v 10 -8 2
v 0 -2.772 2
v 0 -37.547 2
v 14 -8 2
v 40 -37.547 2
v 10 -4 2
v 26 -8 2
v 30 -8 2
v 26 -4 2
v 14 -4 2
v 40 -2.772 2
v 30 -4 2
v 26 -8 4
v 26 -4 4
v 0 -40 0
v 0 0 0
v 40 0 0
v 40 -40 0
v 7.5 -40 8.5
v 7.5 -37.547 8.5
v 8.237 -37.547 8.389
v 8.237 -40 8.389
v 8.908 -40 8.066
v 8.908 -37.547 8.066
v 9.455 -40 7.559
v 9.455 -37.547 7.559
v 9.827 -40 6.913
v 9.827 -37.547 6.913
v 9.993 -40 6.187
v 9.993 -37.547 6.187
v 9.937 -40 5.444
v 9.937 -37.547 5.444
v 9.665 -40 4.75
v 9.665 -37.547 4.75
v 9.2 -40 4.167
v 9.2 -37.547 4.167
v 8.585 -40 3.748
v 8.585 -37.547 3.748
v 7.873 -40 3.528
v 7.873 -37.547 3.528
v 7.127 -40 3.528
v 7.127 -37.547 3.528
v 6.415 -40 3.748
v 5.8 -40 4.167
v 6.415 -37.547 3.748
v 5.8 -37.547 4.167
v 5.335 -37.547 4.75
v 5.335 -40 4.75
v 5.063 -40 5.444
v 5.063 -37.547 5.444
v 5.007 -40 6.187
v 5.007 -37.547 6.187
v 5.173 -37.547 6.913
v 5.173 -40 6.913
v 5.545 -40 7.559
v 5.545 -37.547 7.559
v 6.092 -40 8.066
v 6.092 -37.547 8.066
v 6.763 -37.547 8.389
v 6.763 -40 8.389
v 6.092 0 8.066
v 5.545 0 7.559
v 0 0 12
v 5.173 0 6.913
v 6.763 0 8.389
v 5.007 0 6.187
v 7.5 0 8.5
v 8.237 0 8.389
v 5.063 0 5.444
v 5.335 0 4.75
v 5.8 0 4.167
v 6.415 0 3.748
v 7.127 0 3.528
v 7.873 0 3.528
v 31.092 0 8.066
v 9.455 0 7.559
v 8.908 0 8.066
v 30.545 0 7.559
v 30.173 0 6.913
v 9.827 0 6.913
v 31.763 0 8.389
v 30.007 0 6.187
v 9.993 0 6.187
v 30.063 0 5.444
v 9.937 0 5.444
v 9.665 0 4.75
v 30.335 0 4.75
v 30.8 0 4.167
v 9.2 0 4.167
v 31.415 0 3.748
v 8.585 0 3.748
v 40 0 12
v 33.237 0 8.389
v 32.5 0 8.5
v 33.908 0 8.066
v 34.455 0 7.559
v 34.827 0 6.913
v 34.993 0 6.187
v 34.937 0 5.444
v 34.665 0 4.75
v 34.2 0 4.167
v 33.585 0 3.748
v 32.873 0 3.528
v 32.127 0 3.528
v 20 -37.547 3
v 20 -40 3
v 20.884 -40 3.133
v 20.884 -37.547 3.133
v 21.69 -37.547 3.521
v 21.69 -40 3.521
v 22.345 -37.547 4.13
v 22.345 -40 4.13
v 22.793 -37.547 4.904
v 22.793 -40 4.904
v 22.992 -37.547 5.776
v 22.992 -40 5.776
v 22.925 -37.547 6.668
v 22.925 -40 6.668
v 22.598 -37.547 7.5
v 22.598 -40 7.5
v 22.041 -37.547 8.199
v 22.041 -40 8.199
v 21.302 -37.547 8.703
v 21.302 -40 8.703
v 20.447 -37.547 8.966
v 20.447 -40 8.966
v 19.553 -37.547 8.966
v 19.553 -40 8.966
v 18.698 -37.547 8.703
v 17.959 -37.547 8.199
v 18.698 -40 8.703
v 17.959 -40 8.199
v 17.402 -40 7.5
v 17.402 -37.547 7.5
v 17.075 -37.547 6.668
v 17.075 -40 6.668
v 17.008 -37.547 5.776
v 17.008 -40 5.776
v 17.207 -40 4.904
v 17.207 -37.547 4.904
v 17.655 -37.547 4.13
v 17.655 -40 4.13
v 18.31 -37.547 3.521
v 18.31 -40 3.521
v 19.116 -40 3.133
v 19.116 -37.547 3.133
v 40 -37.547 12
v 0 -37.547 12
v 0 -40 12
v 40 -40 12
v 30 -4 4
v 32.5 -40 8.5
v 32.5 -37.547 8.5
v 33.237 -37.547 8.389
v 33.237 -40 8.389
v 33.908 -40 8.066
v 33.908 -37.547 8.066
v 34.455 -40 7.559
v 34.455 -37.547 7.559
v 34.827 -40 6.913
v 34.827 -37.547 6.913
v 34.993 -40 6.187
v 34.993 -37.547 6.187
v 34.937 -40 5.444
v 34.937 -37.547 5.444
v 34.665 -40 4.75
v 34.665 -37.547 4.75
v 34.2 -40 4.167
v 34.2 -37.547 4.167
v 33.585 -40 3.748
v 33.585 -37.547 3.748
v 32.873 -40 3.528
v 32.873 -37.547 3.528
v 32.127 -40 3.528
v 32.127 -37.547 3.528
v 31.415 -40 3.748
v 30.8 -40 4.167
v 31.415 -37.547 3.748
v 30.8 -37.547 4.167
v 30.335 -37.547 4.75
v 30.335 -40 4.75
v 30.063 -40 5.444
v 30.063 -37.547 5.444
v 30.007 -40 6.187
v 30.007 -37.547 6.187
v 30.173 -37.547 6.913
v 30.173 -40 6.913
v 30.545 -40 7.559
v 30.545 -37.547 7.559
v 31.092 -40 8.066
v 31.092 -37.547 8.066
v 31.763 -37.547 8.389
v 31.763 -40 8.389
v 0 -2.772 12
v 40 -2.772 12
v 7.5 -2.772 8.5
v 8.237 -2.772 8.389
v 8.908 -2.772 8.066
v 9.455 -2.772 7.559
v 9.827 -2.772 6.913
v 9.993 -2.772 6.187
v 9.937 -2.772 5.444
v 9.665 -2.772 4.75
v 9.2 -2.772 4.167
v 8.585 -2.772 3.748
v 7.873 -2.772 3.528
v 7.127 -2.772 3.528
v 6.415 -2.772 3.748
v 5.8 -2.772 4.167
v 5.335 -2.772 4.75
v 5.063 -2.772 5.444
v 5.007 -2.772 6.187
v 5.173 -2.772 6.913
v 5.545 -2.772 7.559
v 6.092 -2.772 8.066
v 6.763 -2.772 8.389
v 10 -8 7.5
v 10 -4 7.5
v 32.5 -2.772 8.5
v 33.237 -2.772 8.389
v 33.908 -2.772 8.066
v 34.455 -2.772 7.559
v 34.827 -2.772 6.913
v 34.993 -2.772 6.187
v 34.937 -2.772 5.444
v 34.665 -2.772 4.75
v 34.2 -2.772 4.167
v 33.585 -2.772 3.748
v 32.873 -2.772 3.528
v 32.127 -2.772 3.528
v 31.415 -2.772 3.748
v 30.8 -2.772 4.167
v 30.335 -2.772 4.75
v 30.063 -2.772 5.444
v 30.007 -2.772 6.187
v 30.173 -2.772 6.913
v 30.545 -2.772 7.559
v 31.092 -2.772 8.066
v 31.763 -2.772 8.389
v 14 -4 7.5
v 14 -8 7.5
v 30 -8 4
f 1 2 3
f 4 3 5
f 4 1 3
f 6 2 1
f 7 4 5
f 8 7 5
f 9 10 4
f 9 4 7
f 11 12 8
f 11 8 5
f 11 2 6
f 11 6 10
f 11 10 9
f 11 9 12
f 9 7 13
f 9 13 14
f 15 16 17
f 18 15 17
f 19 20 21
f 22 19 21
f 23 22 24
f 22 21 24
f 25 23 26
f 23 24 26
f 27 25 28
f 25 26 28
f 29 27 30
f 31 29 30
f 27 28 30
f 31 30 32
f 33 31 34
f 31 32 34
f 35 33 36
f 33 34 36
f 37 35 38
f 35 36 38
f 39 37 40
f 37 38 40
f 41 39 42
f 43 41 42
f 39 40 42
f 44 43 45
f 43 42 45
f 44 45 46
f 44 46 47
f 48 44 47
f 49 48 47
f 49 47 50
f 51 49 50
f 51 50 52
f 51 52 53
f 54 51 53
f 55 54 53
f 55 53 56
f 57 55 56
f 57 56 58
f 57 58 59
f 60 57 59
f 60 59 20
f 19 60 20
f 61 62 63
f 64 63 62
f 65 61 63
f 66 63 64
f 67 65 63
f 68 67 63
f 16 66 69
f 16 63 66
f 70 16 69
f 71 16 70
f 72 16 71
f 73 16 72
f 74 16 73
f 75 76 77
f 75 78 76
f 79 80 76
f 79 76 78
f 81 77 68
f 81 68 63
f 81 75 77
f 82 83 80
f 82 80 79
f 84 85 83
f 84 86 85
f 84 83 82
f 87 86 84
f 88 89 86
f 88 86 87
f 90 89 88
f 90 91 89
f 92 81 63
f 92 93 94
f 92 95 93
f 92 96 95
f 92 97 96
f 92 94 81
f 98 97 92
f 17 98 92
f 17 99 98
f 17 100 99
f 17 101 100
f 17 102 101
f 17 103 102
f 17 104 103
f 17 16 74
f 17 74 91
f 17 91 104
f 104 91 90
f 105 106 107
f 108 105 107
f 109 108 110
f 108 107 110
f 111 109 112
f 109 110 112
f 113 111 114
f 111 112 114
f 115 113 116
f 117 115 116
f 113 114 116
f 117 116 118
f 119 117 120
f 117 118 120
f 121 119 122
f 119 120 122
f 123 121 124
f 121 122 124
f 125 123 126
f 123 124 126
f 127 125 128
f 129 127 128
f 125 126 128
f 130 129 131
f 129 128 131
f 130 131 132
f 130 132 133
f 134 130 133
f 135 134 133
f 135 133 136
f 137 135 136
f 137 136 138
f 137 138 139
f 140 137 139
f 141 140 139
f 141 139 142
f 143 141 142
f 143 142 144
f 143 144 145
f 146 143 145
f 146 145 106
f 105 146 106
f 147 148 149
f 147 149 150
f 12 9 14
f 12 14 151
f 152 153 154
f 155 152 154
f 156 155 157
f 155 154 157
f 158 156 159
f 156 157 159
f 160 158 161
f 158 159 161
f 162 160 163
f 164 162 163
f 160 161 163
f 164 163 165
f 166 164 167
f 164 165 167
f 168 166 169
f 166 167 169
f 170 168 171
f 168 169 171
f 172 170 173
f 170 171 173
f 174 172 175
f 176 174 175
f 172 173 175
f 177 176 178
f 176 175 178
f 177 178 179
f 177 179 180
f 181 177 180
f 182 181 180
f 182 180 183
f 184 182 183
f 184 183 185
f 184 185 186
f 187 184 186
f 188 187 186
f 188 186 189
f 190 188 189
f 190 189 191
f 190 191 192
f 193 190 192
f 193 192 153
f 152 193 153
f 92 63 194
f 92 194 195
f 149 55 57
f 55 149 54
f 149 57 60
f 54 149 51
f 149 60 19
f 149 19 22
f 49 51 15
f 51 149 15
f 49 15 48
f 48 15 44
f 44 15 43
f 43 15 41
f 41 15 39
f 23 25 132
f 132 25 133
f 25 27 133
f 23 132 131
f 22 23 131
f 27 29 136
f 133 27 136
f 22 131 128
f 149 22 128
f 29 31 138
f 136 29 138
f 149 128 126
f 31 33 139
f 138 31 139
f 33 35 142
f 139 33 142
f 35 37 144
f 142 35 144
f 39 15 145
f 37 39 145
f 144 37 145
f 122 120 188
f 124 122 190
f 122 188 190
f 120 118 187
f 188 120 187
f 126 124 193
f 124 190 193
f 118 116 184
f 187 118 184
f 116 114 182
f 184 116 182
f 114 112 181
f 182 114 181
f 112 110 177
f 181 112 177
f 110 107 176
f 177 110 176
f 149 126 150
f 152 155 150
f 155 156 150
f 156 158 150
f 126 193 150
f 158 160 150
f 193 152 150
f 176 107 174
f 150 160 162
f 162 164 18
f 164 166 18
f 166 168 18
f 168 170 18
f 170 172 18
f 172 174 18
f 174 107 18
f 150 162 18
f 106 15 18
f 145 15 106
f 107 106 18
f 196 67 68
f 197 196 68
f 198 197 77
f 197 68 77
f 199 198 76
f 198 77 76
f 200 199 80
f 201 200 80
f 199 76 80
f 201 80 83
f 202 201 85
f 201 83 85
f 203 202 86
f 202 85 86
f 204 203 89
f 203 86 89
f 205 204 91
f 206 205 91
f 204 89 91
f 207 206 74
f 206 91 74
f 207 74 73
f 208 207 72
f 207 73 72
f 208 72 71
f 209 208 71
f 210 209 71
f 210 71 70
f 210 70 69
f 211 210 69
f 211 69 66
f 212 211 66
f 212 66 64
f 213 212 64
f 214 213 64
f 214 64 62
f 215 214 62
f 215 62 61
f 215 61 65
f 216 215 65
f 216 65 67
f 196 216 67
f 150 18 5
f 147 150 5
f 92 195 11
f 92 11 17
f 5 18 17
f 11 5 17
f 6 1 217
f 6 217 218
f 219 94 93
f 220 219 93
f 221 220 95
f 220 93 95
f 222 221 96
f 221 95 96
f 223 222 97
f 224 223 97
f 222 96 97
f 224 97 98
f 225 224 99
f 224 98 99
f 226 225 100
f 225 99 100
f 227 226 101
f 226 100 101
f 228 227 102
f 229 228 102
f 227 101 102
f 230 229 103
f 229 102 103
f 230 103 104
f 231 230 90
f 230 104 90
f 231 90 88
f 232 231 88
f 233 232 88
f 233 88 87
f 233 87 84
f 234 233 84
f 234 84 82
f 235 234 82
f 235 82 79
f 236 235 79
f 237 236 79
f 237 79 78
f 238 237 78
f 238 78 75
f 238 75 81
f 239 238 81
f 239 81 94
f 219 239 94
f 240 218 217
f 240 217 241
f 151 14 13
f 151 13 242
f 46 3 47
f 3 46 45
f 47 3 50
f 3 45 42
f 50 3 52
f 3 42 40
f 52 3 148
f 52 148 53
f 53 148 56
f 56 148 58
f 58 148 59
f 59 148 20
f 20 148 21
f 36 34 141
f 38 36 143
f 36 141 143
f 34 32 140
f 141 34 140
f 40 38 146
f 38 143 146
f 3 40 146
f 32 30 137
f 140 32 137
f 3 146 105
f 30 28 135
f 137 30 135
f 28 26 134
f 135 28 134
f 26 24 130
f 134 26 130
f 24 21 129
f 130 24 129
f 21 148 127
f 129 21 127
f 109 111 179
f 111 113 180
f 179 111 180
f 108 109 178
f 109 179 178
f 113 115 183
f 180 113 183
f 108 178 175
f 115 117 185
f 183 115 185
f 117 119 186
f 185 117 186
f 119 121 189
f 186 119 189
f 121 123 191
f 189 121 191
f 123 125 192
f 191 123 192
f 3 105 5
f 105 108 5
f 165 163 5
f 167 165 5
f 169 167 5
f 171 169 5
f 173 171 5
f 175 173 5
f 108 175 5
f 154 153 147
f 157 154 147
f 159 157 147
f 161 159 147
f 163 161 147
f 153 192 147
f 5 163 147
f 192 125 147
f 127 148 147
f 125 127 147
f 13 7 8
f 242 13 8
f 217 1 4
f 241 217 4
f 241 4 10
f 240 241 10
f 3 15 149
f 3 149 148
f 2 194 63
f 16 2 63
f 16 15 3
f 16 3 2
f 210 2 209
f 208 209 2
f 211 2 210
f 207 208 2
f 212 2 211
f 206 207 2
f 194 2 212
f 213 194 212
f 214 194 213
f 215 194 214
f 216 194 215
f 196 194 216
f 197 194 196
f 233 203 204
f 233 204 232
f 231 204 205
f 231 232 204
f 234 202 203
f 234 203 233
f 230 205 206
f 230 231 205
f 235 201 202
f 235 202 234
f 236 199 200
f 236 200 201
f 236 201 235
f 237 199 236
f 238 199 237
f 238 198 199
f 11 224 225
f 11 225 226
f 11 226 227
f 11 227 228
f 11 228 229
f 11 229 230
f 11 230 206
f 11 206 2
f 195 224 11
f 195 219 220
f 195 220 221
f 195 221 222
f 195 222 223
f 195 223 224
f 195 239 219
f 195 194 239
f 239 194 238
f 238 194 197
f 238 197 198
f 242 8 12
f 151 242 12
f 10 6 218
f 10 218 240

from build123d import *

# Parameters (mm, degrees)
SKETCH_2_W          = 40
SKETCH_2_H          = 40
EXTRUDE_1_DEPTH     = 12
SKETCH_3_R          = 2.5
CUT_EXTRUDE_1_DEPTH = 58.827329179
SKETCH_4_W          = 40
SKETCH_4_H          = 34.775319462
CUT_EXTRUDE_2_DEPTH = 10
SKETCH_6_R          = 3
CUT_EXTRUDE_3_DEPTH = 10
SKETCH_7_W          = 4
SKETCH_7_H          = 4
EXTRUDE_2_DEPTH     = 2
SKETCH_7_3_W        = 4
SKETCH_7_3_H        = 4
EXTRUDE_3_DEPTH     = 5.5


with BuildPart() as part:
    # 스케치2 → 보스-돌출1 (new body)
    with BuildSketch(Plane.XY):
        with Locations((20, -20)):
            Rectangle(SKETCH_2_W, SKETCH_2_H)
    extrude(amount=EXTRUDE_1_DEPTH)

    # 스케치3 → 컷-돌출1 (cut, through all)
    with BuildSketch(Plane(origin=(0, 0, 0), x_dir=(1, 0, 0), z_dir=(0, 1, 0))):
        with Locations((7.5, -6)):
            Circle(SKETCH_3_R)
        with Locations((32.5, -6)):
            Circle(SKETCH_3_R)
    extrude(amount=-CUT_EXTRUDE_1_DEPTH, mode=Mode.SUBTRACT)

    # 스케치4 → 컷-돌출2 (cut)
    with BuildSketch(Plane.XY.offset(12)):
        with Locations((20, -20.159533284)):
            Rectangle(SKETCH_4_W, SKETCH_4_H)
    extrude(amount=-CUT_EXTRUDE_2_DEPTH, mode=Mode.SUBTRACT)

    # 스케치6 → 컷-돌출3 (cut)
    with BuildSketch(Plane.XZ.offset(40)):
        with Locations((20, 6)):
            Circle(SKETCH_6_R)
    extrude(amount=-CUT_EXTRUDE_3_DEPTH, mode=Mode.SUBTRACT)

    # 스케치7 → 보스-돌출2 (add)
    with BuildSketch(Plane.XY.offset(2)):
        with Locations((28, -6)):
            Rectangle(SKETCH_7_W, SKETCH_7_H)
    extrude(amount=EXTRUDE_2_DEPTH)

    # 스케치7<3> → 보스-돌출3 (add)
    with BuildSketch(Plane.XY.offset(2)):
        with Locations((12, -6)):
            Rectangle(SKETCH_7_3_W, SKETCH_7_3_H)
    extrude(amount=EXTRUDE_3_DEPTH)


solid = part.part
